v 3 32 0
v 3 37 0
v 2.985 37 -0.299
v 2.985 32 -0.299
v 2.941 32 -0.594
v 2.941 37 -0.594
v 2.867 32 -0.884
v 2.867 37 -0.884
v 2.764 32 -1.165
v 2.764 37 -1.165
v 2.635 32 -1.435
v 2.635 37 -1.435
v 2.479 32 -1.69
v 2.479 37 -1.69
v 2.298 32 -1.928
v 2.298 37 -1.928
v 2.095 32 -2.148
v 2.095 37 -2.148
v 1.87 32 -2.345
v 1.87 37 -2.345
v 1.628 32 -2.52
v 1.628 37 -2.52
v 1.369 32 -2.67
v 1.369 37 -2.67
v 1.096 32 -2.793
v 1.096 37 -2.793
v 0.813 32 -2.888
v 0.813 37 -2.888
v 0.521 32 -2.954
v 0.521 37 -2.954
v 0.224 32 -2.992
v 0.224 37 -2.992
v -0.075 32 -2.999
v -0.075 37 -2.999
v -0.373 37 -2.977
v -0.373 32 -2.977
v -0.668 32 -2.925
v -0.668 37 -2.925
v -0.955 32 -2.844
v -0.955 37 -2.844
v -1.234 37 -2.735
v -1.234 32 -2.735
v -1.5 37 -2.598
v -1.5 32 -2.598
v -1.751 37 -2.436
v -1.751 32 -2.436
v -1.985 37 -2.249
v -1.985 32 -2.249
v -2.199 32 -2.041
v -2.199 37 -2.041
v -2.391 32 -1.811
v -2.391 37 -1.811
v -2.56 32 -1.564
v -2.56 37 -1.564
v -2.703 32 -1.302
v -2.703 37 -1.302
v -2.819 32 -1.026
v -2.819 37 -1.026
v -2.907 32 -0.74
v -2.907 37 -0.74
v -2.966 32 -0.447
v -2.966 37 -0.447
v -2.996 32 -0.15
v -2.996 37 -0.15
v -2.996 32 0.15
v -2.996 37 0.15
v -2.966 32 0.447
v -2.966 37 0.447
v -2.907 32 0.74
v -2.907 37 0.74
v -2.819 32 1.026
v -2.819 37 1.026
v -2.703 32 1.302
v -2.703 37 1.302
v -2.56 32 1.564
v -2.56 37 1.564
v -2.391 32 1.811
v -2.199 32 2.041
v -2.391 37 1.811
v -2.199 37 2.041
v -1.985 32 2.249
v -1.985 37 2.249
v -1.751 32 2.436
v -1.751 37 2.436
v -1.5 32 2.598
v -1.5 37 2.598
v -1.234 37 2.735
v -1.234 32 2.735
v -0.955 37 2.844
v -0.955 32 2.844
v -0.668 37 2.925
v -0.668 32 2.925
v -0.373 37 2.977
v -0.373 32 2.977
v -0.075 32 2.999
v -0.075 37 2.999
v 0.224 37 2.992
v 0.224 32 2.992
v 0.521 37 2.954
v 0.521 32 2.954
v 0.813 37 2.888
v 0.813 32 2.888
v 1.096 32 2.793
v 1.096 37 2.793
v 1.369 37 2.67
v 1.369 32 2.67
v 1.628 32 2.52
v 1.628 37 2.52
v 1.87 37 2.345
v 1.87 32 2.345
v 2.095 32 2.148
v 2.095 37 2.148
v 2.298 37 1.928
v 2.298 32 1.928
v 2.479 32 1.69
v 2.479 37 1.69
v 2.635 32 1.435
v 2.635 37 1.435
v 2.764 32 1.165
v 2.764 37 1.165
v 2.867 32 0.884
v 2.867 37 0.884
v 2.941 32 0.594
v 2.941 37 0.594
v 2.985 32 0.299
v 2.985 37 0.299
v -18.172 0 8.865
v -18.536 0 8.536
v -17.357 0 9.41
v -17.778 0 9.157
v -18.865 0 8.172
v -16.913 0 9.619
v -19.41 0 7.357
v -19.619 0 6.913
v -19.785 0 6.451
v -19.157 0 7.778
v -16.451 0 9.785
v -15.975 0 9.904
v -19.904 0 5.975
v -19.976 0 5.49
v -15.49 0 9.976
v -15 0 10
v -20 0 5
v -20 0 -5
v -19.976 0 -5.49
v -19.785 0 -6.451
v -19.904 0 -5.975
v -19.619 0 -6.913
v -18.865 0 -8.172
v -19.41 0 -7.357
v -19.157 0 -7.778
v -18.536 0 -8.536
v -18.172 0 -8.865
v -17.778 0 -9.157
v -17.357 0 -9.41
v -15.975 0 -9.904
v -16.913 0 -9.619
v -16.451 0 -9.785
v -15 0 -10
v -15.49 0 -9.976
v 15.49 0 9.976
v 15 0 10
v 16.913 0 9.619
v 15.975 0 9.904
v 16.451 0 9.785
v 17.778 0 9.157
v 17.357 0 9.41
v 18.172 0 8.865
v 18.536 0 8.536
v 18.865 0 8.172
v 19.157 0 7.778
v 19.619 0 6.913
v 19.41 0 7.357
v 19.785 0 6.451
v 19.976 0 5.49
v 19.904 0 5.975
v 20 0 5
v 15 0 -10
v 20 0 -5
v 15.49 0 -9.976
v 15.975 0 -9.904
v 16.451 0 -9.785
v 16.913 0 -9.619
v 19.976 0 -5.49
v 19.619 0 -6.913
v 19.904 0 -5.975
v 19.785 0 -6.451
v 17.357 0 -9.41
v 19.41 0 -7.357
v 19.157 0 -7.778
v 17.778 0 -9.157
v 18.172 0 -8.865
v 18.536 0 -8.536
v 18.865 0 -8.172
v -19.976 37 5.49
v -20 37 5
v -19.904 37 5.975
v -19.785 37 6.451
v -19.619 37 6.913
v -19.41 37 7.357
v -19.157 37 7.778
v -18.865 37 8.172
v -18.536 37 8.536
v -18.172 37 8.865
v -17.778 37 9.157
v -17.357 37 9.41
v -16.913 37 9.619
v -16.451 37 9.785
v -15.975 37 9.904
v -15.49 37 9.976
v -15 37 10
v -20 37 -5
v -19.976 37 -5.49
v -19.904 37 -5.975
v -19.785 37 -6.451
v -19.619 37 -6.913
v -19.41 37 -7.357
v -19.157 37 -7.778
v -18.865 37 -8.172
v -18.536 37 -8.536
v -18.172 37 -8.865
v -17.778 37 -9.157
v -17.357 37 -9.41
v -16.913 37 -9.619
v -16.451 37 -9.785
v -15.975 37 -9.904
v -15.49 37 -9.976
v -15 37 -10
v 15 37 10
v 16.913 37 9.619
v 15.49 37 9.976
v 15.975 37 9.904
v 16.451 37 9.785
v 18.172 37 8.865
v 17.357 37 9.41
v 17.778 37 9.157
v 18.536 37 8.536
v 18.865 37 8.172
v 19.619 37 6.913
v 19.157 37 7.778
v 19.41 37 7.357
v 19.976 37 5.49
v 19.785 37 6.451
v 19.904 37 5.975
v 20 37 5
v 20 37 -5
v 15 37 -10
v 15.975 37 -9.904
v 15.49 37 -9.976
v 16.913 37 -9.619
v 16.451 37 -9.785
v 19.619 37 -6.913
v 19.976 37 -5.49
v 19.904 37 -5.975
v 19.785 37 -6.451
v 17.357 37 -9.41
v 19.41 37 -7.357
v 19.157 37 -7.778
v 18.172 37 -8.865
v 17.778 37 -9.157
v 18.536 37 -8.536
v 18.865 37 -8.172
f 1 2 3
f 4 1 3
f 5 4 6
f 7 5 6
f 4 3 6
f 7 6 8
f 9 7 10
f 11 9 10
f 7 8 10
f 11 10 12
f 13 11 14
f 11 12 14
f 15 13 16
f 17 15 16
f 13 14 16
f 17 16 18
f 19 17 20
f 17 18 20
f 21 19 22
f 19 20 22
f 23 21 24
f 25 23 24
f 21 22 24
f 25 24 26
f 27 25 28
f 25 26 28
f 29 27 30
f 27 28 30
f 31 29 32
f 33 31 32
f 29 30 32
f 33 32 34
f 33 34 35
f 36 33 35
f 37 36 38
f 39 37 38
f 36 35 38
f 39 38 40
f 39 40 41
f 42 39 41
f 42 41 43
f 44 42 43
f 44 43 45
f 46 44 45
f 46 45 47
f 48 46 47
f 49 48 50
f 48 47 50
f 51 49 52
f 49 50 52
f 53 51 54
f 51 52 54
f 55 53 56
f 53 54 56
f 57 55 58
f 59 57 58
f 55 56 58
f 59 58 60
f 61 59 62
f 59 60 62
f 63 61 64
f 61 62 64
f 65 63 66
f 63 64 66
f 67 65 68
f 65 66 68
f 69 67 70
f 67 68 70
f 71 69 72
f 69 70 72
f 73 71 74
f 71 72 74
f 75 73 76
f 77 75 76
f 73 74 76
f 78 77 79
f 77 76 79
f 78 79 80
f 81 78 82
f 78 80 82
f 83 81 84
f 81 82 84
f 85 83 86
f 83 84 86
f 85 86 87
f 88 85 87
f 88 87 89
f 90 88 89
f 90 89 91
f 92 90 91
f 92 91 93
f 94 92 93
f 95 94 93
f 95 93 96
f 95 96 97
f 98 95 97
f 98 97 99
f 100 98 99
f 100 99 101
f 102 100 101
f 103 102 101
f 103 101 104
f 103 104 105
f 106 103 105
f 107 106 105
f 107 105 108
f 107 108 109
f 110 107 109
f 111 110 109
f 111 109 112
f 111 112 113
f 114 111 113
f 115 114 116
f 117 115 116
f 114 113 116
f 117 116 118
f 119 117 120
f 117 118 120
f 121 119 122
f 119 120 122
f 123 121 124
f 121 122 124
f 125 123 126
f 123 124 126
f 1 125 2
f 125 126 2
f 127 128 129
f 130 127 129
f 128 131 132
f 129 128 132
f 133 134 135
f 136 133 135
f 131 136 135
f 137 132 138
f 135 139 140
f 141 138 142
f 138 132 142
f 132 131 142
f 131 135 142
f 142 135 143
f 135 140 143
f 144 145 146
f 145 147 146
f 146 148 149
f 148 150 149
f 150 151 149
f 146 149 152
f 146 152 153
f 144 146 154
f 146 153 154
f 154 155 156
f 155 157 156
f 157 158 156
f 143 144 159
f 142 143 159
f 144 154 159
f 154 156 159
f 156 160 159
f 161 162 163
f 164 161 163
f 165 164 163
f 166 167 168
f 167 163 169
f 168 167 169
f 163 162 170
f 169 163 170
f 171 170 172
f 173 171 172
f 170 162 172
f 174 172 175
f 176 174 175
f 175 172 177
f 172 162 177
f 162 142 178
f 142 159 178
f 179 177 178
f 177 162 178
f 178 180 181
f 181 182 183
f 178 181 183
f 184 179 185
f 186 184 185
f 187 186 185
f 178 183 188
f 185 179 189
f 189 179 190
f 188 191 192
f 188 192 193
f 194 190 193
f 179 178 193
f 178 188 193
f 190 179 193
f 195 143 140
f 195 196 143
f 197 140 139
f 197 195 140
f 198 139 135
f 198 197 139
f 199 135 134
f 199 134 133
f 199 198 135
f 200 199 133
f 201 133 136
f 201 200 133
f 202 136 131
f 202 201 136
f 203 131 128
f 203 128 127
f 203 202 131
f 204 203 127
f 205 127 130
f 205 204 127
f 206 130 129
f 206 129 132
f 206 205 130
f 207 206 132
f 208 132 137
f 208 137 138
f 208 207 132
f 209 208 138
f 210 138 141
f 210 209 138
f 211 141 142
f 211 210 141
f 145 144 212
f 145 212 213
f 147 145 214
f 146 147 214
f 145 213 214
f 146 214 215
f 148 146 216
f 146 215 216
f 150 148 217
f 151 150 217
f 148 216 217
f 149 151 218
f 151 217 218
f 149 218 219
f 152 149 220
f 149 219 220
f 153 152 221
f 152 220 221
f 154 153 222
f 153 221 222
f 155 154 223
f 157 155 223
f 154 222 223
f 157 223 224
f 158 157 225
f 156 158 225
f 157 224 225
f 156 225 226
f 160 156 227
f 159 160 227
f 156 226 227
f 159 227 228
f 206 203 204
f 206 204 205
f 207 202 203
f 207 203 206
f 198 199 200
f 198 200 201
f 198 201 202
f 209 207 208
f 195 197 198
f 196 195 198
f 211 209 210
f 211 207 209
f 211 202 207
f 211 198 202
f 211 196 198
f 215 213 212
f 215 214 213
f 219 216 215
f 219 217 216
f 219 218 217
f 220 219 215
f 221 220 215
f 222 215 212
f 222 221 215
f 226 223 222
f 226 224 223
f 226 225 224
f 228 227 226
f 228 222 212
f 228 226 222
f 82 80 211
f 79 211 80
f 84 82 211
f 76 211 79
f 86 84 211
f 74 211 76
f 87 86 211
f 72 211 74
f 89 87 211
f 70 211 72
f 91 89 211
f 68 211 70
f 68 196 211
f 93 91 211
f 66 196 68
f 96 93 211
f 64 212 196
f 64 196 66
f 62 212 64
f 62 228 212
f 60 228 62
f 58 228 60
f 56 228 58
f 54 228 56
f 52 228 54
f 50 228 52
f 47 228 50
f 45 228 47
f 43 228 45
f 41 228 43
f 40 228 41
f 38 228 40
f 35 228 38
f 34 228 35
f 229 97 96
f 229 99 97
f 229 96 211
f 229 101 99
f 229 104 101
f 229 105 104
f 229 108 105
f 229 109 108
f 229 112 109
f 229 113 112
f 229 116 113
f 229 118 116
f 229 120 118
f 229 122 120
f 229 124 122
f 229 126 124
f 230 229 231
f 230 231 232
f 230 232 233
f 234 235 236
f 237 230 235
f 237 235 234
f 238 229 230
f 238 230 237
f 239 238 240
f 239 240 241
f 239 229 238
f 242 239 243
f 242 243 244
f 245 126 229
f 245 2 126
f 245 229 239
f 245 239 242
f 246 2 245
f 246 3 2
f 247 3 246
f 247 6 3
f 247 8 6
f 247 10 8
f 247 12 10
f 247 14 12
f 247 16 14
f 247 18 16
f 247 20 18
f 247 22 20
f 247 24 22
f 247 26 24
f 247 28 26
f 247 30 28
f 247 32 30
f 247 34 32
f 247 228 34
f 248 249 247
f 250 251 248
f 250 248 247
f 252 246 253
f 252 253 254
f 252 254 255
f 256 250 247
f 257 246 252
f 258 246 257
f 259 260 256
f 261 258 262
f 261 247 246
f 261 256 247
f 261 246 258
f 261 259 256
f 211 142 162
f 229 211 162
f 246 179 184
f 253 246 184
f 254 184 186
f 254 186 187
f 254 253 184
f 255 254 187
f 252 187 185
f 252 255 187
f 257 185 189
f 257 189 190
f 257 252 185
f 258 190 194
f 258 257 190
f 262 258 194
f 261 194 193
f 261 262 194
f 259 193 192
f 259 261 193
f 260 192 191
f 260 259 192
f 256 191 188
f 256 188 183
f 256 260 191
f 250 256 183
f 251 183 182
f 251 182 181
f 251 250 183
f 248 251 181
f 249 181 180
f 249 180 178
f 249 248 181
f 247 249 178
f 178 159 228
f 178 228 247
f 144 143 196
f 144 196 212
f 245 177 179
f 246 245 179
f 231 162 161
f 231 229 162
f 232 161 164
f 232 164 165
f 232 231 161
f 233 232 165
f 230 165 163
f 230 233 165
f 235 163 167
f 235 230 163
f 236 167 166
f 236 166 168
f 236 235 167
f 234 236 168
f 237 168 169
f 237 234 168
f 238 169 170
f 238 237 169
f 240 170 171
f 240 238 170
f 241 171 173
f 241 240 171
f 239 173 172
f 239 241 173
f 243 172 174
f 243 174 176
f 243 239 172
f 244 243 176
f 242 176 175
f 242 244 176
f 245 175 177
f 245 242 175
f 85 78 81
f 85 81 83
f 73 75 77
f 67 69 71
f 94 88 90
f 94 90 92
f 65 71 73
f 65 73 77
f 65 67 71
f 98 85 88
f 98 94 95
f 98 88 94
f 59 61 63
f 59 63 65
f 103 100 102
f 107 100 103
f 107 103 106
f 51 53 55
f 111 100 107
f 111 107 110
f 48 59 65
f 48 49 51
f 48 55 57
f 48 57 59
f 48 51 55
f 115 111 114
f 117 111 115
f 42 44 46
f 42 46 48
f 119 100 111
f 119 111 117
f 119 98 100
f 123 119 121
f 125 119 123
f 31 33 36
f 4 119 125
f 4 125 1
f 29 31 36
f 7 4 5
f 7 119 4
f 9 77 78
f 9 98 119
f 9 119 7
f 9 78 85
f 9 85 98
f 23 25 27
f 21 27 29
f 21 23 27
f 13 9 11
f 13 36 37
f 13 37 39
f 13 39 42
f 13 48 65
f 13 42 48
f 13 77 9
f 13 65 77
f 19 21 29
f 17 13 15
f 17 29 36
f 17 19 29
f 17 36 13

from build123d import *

# Parameters (mm, degrees)
SKETCH1_W           = 40
SKETCH1_H           = 20
BOSS_EXTRUDE1_DEPTH = 37
FILLET1_R           = 5
SKETCH2_R           = 3
CUT_EXTRUDE1_DEPTH  = 5


with BuildPart() as part:
    # Sketch1 → Boss-Extrude1 (new body)
    with BuildSketch(Plane(origin=(0, 0, 0), x_dir=(1, 0, 0), z_dir=(0, 1, 0))):
        Rectangle(SKETCH1_W, SKETCH1_H)
    extrude(amount=BOSS_EXTRUDE1_DEPTH)

    # Fillet1
    fillet1_edges = [part.edges().sort_by_distance(p)[0] for p in [
        (20, 18.5, 10),
        (-20, 18.5, 10),
        (-20, 18.5, -10),
        (20, 18.5, -10),
    ]]
    fillet(fillet1_edges, radius=FILLET1_R)

    # Sketch2 → Cut-Extrude1 (cut)
    with BuildSketch(Plane(origin=(0, 37, 0), x_dir=(1, 0, 0), z_dir=(0, 1, 0))):
        Circle(SKETCH2_R)
    extrude(amount=-CUT_EXTRUDE1_DEPTH, mode=Mode.SUBTRACT)


solid = part.part
